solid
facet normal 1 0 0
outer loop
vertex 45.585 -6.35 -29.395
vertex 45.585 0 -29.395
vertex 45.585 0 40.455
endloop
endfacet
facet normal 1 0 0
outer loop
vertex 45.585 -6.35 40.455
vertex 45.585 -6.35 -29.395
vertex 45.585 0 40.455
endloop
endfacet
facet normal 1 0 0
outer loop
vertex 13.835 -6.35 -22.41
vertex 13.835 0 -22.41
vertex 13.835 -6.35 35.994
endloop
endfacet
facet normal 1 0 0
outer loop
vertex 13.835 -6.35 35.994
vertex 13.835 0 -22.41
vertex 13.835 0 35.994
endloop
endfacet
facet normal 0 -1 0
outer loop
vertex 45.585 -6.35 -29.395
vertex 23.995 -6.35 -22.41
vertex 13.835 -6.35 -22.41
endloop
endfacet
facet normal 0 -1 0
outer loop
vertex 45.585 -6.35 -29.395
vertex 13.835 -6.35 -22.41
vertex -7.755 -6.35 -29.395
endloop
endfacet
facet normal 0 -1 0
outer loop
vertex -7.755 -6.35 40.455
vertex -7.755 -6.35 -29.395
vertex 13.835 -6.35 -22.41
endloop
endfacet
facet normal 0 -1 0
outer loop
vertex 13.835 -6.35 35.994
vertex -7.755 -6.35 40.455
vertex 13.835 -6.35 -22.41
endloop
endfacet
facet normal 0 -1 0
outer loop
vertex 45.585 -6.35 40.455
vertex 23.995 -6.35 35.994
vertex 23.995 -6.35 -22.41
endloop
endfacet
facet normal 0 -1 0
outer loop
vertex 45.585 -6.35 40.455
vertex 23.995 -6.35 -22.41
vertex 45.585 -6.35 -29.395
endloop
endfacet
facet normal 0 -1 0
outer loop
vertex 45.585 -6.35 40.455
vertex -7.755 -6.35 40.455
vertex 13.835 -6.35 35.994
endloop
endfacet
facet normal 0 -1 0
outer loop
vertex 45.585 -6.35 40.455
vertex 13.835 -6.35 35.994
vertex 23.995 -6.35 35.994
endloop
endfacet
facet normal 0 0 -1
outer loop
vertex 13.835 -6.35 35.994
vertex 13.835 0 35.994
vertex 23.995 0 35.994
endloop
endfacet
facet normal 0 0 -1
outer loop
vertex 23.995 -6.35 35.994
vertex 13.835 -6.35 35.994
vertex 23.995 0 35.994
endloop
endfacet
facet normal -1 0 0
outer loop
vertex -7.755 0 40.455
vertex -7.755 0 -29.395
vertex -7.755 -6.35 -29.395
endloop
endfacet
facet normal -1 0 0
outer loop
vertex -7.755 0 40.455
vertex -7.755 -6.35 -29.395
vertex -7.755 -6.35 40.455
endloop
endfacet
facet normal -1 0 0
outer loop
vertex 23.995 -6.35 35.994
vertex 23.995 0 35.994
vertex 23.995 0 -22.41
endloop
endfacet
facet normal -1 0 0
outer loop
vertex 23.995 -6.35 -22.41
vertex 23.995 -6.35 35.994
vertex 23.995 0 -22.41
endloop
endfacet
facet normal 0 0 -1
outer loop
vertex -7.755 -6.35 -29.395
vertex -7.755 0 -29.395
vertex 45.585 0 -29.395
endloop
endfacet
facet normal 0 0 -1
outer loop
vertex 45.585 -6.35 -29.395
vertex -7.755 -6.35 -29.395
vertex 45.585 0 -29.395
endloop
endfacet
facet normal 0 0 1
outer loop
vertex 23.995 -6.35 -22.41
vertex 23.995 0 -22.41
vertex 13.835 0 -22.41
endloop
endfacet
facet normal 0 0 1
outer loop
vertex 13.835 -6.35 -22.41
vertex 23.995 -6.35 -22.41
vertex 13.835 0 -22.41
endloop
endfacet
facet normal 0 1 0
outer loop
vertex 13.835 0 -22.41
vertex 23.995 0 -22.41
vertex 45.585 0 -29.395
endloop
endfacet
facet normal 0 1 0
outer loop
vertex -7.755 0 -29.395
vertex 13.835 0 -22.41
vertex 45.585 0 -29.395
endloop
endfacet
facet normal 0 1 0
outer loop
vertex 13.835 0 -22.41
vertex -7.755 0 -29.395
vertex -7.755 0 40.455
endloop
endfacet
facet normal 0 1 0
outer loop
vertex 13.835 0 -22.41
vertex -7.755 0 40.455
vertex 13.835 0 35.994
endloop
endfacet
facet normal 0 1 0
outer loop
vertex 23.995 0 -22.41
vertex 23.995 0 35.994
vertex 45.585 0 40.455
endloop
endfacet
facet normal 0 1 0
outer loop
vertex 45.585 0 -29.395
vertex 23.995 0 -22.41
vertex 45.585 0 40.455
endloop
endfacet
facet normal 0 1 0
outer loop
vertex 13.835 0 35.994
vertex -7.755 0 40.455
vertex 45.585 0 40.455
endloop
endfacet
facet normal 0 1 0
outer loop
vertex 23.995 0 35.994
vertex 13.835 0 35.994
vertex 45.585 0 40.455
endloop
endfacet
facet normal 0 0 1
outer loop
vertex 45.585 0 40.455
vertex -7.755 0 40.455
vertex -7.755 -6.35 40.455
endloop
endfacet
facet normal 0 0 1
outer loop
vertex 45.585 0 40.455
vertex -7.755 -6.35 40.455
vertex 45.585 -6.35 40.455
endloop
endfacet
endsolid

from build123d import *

# Parameters (mm, degrees)
F0_W     = 53.34
F0_H     = 69.85
F1_DEPTH = 6.35


with BuildPart() as f1:
    # F0 (on Front) → F1 (new body)
    with BuildSketch(Plane.XZ):
        with Locations((18.915267, 5.530364)):
            Rectangle(F0_W, F0_H)
        Polygon((23.995267, 25.834043), (23.995267, 5.530364), (23.995267, -12.249636), (23.995267, -22.409636), (13.835267, -22.409636), (13.835267, -12.249636), (13.835267, 5.530364), (13.835267, 23.310364), (13.835267, 25.834043), (13.835267, 35.994043), (23.995267, 35.994043), align=None, mode=Mode.SUBTRACT)
    extrude(amount=F1_DEPTH)


solid = f1.part
